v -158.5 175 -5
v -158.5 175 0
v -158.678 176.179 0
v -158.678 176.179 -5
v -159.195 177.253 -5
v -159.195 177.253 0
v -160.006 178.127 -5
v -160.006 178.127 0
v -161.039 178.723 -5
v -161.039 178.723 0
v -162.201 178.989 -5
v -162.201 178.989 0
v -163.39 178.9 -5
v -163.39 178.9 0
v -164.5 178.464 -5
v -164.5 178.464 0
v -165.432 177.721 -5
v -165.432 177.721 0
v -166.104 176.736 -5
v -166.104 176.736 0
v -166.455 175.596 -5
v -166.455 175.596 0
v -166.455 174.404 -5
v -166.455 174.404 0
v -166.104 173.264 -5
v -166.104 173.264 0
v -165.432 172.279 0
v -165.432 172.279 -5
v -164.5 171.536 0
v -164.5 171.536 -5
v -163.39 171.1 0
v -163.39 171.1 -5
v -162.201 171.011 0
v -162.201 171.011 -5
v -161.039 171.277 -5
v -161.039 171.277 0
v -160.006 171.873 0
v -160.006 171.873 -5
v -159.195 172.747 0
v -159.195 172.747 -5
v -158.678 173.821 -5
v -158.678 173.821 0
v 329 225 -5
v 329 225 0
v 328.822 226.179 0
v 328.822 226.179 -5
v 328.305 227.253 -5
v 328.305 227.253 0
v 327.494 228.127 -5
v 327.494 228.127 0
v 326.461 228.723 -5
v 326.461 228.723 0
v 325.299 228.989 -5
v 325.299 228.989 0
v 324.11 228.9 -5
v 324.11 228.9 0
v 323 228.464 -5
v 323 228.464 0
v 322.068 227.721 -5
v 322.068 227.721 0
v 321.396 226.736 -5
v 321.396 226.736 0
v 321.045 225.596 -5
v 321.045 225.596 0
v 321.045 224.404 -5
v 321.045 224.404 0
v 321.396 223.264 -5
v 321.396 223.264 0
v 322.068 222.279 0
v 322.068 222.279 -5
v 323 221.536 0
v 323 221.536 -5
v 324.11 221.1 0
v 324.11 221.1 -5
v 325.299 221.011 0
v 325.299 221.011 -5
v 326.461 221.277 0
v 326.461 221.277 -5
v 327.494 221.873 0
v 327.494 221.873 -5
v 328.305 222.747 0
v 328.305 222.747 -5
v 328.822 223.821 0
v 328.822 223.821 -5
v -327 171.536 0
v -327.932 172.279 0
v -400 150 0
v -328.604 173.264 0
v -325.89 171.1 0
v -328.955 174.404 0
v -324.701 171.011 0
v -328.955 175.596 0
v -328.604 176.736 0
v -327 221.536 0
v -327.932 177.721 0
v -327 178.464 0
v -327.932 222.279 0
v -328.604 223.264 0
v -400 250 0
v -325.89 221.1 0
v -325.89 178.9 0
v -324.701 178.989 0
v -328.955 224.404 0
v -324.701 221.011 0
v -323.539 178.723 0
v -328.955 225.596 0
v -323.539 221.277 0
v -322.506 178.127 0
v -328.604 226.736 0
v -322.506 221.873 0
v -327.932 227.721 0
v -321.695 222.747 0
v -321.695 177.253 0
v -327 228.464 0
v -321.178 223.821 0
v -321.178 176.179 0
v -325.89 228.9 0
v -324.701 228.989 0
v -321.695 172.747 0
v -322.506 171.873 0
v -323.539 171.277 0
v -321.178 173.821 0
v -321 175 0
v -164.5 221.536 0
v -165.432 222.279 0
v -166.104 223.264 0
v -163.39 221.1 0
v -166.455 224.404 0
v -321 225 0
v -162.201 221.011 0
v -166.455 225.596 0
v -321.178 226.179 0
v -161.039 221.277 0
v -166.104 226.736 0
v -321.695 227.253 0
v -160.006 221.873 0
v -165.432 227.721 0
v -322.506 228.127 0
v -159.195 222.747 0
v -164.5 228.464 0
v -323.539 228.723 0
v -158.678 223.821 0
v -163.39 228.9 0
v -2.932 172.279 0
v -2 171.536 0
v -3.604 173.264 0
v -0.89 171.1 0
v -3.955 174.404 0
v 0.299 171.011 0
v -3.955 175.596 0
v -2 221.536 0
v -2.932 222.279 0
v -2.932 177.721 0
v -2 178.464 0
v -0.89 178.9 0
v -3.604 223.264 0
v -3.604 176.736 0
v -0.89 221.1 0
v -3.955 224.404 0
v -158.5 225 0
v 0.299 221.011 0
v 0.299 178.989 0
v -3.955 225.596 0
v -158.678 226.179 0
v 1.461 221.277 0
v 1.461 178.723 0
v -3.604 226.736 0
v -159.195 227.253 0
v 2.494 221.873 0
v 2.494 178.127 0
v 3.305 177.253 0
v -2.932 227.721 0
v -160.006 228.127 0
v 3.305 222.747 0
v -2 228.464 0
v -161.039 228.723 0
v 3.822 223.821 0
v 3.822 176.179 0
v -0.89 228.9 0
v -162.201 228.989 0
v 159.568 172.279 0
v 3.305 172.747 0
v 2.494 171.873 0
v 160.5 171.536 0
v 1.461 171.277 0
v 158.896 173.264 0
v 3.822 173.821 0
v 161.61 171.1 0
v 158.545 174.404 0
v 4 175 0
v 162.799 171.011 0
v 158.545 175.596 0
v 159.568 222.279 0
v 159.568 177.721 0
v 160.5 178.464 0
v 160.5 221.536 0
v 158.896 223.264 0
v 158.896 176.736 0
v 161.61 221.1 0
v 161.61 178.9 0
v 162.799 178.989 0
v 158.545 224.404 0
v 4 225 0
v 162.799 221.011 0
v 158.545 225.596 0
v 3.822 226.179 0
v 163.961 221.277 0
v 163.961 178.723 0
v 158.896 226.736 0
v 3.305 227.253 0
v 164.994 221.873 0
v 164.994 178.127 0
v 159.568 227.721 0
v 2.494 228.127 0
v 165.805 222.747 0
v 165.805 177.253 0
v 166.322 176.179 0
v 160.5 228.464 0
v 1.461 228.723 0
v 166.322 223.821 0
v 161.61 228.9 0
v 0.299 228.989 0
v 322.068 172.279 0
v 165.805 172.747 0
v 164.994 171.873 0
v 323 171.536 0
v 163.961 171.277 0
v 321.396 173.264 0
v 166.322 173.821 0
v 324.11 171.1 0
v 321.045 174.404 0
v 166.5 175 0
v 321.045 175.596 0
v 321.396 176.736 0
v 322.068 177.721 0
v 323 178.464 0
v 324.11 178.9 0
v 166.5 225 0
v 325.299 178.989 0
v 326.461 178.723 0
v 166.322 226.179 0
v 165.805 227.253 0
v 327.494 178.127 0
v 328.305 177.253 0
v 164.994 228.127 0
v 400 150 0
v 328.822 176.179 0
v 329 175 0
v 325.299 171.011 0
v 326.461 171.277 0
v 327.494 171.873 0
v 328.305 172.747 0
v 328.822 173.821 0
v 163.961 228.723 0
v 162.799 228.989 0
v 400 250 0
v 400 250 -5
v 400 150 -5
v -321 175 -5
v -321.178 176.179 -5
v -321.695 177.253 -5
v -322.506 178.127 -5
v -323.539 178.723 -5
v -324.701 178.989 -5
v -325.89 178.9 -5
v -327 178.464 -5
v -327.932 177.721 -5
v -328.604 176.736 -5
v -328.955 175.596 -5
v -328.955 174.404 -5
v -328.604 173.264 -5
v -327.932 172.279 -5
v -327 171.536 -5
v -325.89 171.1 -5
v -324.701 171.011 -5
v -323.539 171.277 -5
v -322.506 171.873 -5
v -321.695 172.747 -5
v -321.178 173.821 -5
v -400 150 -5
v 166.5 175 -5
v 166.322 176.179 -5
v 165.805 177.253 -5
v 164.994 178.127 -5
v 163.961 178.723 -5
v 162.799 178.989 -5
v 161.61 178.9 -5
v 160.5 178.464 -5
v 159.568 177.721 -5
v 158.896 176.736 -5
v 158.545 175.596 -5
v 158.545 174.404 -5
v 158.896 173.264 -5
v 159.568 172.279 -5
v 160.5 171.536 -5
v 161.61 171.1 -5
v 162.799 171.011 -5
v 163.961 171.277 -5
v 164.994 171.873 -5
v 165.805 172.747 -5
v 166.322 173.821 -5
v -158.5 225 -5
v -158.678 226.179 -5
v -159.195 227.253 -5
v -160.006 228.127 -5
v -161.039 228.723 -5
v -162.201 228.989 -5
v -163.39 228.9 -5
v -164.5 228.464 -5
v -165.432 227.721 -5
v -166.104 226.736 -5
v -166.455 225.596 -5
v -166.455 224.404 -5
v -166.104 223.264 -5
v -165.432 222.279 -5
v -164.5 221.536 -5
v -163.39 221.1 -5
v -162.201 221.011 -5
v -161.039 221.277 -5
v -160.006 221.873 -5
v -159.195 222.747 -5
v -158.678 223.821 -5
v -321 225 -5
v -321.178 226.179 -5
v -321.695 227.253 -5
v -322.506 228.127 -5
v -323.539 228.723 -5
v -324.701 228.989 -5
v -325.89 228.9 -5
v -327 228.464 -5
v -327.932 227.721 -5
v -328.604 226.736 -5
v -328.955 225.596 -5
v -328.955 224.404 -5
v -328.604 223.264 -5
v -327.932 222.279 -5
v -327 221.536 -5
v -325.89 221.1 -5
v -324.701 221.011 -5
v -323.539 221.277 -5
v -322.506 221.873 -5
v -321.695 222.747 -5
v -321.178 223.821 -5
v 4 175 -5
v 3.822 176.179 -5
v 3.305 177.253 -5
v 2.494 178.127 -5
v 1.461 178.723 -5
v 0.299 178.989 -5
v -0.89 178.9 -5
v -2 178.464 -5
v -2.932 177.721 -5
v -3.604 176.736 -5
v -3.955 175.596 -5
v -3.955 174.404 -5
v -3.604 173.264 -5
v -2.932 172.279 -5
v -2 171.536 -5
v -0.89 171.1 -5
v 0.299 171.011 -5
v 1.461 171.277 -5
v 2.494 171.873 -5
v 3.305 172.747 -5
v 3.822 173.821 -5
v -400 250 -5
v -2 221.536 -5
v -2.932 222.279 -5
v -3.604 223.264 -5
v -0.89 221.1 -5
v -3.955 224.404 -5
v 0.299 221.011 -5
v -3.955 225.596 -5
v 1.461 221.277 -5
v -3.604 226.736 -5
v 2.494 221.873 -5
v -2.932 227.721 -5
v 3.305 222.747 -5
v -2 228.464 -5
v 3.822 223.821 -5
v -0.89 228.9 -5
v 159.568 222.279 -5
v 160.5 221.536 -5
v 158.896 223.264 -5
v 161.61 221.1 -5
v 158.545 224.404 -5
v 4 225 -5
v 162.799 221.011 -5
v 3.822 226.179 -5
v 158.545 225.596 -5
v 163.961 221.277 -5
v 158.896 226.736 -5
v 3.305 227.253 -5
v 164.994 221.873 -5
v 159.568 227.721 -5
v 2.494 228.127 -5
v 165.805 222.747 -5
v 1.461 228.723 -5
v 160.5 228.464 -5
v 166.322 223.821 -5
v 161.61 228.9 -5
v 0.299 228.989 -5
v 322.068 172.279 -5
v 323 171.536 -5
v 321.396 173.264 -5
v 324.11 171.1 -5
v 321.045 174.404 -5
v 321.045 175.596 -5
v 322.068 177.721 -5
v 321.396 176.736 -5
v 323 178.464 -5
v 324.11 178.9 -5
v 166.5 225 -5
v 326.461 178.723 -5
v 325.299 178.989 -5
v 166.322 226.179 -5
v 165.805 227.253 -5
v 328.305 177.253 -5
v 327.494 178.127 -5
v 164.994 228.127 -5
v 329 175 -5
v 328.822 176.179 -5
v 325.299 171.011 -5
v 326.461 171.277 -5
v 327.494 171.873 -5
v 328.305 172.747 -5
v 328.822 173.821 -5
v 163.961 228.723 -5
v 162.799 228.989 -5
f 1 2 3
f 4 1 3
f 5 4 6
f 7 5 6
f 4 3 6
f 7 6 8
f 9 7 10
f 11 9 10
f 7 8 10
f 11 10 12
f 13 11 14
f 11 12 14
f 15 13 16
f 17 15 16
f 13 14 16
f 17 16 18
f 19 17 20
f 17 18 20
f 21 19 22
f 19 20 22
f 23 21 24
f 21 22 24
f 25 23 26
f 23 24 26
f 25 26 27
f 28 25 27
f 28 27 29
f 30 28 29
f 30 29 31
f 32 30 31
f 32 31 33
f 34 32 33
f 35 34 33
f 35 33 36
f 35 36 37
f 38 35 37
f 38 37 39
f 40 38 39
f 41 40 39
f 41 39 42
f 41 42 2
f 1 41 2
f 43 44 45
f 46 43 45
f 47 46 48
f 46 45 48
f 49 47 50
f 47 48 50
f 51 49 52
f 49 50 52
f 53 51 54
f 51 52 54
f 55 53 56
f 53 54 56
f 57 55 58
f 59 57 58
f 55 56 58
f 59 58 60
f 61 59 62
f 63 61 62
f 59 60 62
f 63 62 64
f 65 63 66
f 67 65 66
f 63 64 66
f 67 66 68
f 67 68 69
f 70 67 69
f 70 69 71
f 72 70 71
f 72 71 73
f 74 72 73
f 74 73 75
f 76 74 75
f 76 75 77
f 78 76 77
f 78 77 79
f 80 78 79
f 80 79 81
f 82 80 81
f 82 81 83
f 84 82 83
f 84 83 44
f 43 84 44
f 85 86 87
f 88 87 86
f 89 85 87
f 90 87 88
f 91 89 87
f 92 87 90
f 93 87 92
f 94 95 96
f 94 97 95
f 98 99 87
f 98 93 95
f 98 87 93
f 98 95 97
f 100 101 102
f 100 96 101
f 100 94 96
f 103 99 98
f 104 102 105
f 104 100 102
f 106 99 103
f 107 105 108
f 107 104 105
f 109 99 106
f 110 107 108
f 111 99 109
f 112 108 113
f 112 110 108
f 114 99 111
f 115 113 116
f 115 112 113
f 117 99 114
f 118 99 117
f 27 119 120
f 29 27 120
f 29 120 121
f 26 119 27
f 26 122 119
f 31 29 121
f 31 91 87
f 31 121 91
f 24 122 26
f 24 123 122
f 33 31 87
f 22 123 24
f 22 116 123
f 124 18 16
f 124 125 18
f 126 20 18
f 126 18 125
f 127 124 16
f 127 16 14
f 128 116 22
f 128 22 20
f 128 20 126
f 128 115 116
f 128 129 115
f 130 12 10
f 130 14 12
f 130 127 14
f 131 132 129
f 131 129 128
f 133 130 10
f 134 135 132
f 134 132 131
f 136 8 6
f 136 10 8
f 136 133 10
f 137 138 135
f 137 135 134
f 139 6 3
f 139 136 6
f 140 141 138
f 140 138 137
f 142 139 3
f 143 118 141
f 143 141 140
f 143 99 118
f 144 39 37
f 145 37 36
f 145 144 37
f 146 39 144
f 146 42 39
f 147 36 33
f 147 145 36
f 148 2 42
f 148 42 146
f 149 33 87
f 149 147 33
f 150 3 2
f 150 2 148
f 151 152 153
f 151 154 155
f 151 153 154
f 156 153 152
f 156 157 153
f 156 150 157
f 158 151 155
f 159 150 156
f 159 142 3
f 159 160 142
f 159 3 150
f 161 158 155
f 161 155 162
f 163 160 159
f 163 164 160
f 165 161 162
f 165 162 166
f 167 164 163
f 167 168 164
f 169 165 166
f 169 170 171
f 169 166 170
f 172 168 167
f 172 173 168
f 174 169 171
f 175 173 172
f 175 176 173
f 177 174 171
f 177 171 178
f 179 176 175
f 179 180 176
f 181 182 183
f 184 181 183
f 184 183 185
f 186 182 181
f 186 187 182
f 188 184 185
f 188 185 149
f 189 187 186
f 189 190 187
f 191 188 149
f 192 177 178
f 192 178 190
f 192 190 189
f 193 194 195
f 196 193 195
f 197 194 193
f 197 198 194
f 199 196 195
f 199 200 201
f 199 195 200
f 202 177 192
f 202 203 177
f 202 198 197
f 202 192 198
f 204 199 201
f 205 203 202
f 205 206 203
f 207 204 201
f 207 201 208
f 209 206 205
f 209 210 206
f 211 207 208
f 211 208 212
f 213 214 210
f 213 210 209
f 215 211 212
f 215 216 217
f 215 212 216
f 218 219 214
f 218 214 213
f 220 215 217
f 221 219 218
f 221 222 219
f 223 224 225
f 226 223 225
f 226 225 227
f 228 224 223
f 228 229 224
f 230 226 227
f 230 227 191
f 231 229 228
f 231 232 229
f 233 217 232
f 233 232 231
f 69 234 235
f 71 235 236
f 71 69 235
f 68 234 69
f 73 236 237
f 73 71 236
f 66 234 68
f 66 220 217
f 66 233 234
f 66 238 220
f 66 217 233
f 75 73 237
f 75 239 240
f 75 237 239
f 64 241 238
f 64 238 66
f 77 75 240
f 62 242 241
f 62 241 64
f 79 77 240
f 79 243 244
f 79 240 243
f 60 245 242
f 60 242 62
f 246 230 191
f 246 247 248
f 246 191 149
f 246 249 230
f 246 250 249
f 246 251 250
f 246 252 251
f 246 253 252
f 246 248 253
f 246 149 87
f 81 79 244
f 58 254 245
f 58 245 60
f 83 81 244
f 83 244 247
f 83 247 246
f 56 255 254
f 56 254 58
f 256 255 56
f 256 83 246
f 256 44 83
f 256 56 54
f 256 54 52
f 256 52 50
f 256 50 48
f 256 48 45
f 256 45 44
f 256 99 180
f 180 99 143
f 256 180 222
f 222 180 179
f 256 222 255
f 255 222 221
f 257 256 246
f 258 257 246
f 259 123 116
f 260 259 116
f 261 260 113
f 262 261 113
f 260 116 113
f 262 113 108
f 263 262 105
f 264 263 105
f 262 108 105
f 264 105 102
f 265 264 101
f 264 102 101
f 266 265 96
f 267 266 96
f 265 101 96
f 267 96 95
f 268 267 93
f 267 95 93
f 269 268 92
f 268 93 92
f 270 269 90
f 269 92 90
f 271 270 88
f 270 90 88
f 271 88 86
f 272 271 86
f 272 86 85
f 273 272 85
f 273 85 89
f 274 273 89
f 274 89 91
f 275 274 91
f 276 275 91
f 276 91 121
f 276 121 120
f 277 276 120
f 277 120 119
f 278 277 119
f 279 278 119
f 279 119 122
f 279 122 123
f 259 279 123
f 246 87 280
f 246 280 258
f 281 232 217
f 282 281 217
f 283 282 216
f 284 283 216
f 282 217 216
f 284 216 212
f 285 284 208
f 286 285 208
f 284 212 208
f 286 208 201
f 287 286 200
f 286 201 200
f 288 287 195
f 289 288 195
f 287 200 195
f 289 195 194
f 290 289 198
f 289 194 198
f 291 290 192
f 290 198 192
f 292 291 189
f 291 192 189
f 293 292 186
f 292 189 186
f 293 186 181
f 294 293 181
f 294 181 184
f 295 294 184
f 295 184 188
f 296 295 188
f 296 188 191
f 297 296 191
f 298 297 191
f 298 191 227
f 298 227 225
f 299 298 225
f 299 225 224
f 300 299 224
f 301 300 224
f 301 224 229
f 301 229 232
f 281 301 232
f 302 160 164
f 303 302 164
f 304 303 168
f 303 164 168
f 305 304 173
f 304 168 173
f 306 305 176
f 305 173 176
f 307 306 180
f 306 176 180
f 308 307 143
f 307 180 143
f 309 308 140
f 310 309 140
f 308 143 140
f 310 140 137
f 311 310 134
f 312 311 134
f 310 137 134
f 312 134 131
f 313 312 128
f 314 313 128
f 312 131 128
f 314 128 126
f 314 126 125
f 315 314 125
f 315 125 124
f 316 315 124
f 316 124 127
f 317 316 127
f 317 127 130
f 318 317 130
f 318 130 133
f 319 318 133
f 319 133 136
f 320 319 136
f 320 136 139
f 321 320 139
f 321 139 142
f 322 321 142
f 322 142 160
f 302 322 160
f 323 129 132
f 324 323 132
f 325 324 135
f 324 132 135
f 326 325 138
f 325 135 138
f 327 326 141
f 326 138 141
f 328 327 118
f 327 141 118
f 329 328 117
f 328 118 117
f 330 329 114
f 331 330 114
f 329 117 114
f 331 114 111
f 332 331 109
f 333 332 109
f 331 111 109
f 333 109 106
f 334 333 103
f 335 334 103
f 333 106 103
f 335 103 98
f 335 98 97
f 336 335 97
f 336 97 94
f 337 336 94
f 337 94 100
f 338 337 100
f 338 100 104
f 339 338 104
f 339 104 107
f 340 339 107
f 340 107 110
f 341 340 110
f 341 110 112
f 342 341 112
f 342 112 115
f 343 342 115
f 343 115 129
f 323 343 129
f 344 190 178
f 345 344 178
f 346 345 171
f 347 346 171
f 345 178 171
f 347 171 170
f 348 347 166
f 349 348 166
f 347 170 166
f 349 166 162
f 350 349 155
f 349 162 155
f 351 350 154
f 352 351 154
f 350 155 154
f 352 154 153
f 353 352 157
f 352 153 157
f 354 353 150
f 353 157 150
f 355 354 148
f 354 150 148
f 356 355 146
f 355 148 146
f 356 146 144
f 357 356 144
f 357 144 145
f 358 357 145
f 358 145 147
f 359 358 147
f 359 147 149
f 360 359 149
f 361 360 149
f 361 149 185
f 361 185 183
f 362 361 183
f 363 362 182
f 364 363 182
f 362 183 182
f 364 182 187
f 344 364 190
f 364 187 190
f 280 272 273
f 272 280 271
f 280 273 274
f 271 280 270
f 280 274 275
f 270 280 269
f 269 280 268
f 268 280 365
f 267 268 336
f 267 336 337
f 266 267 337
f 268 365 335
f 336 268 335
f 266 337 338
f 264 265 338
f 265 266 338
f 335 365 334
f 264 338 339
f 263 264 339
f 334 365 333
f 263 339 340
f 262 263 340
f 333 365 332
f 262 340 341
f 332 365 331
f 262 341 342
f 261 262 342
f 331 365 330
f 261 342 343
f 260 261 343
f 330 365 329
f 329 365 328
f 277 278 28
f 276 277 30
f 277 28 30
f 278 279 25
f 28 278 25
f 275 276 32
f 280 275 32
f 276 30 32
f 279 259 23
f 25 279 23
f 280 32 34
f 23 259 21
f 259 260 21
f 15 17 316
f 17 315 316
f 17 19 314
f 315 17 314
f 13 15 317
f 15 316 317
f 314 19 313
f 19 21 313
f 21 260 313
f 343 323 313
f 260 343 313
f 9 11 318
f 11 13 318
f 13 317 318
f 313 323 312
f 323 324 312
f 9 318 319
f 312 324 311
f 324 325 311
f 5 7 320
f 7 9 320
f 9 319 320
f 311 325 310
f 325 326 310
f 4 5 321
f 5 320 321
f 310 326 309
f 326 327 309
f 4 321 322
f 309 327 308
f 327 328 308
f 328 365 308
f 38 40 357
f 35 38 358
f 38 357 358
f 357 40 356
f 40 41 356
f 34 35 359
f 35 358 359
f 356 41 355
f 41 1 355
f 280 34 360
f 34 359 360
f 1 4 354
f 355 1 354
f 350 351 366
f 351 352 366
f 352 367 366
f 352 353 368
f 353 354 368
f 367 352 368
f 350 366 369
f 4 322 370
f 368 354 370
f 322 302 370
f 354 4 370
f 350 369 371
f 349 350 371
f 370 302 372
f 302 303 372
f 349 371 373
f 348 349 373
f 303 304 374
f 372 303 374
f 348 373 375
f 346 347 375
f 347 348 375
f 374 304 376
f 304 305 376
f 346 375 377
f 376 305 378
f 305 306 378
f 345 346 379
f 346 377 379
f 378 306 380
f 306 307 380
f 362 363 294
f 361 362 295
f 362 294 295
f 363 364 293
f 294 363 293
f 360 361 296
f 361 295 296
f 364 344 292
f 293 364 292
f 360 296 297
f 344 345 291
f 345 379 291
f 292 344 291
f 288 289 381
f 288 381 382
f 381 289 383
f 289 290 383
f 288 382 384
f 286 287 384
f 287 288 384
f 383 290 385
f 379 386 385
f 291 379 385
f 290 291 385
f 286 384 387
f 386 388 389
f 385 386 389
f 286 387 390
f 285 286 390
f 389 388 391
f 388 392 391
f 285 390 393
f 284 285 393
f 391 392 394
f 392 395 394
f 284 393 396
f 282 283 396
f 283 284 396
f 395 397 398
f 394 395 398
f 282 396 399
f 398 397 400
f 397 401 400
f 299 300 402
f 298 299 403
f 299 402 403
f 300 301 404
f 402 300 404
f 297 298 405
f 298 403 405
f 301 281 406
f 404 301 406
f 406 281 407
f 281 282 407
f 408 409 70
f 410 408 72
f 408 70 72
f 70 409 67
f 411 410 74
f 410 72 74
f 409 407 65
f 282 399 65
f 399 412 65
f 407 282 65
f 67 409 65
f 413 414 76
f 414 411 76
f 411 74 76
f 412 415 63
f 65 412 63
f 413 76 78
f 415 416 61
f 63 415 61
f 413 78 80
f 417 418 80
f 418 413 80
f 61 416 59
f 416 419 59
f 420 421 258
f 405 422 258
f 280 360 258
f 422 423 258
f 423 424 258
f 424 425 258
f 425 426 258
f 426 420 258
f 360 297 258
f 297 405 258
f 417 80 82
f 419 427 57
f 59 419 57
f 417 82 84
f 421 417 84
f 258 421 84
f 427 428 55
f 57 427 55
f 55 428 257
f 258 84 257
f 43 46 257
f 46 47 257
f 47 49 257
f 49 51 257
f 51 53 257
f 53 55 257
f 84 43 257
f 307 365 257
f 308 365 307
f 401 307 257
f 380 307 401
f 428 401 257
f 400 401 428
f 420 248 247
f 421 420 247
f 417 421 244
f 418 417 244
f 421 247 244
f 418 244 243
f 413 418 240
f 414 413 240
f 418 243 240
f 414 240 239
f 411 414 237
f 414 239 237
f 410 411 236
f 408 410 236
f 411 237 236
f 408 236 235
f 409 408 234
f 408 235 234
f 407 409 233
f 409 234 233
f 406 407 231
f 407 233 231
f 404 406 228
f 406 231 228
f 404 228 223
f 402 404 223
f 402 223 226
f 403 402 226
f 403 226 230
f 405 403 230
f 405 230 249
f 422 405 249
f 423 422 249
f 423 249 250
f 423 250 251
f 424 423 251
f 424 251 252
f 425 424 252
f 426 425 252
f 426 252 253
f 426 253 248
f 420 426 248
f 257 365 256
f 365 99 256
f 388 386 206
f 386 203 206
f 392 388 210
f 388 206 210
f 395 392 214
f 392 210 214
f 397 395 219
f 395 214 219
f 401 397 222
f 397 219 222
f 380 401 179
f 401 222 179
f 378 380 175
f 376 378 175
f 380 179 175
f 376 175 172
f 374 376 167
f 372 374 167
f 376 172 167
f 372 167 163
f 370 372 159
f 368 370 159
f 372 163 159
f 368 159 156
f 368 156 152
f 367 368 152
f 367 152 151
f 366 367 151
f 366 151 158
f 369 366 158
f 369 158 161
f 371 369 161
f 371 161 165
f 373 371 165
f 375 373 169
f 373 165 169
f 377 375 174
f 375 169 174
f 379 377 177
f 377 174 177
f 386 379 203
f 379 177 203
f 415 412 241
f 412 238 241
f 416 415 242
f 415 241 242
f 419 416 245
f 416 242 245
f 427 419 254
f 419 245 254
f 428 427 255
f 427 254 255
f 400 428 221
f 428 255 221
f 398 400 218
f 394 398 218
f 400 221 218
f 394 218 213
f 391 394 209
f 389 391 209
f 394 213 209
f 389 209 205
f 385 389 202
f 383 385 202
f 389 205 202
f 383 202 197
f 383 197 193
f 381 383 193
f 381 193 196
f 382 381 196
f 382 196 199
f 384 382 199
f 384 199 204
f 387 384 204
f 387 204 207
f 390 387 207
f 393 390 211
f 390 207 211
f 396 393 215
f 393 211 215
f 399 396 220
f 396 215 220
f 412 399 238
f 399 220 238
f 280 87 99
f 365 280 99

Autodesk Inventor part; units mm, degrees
ref_plane "YZ Plane" through (0, 0, 0) normal (1, 0, 0) x (0, 1, 0)
ref_plane "XZ Plane" through (0, 0, 0) normal (0, 1, 0) x (-1, 0, 0)
ref_plane "XY Plane" through (0, 0, 0) normal (0, 0, 1) x (1, 0, 0)
sketch "base_layout_sketch" plane through (0, 0, 0) normal (0, 0, 1) x (1, 0, 0)
  line L0 (-400, 200) -> (400, 200)
  line L1 (400, 200) -> (400, -200)
  line L2 (400, -200) -> (-400, -200)
  line L3 (-400, -200) -> (-400, 200)
  line L4 (0, 200) -> (0, -200) construction
  line L5 (-400, 150) -> (400, 150)
  line L6 (400, 150) -> (400, -150)
  line L7 (400, -150) -> (-400, -150)
  line L8 (-400, -150) -> (-400, 150)
  line L9 (0, 150) -> (0, -150) construction
  line L10 (-400, 250) -> (400, 250)
  line L11 (400, 250) -> (400, -250)
  line L12 (400, -250) -> (-400, -250)
  line L13 (-400, -250) -> (-400, 250)
  line L14 (0, 250) -> (0, -250) construction
  point P0 (0, 0)
  point P1 (0, 0)
  point P2 (-400, 200)
  point P3 (-400, -200)
  point P4 (400, -200)
  point P5 (400, 200)
  dimension "d0" = 400
  dimension "d1" = 800
  dimension "d2" = 300
  dimension "d4" = 500
sketch "bolt_holes_sketch" plane through (0, 0, 0) normal (0, 0, 1) x (1, 0, 0)
  circle A0 centre (-325, 175) radius 4
  line L0 (-400, 250) -> (400, 250) projected
  line L1 (-400, -250) -> (-400, 250) projected
  line L2 (-560, 0) -> (560, 0) projected
  point P0 (0, 0)
  dimension "d3" = 8
  dimension "d6" = 75
  dimension "d21" = 175
extrude "sheet_visualisation" add sketch "base_layout_sketch" against normal blind 5
extrude "bolt_holes Cut" cut sketch "bolt_holes_sketch" against normal through all
pattern_linear "bolt_holes_upper Pattern" count 5 spacing 162.5 along (1, 0, 0) of "bolt_holes Cut"
mirror "bolt_holes Mirror" about plane through (0, 0, 0) normal (0, 1, 0) of "bolt_holes Cut", "bolt_holes_upper Pattern"
ref_plane "Work Plane1" through (-400, 200, 0) normal (0, -1, 0) x (1, 0, 0)
mirror "Mirror2" about plane through (-400, 200, 0) normal (0, -1, 0) of "bolt_holes Cut", "bolt_holes_upper Pattern"
sketch "Sketch3" plane through (0, 0, 0) normal (0, 0, 1) x (1, 0, 0)
  line L0 (400, -250) -> (400, 250) projected
  line L1 (-400, 250) -> (-400, -250) projected
  line L2 (400, -250) -> (-400, -250)
  line L3 (-400, -250) -> (-400, 150)
  line L4 (-400, 150) -> (400, 150)
  line L5 (400, 150) -> (400, -250)
  point P0 (0, 0)
  dimension "d27" = 400
extrude "Extrusion3" cut sketch "Sketch3" against normal blind 9.5
equation "\"d0\" = layer_width"
equation "\"d1\" = track_length"
equation "\"d2\" = track_width"
equation "\"d4\" = real_sheet_width"
equation "\"d3\" = bolt_diameter"
equation "\"d6\" = x_offset_for_bolts"
equation "\"d21\" = y_offset_for_bolts"
equation "\"d14\" = sheet_thickness"
equation "\"track_length\" = 800"
equation "\"layer_width\" = 400"
equation "\"bolt_diameter\" = 8"
equation "\"real_sheet_width\" = 500"
equation "\"x_offset_for_bolts\" = 75"
equation "\"y_offset_for_bolts\" = 175"
equation "\"sheet_thickness\" = 5"
equation "\"track_width\" = 300"
equation "\"ferrite_length\" = 109"
equation "\"ferrite_width\" = 15"
equation "\"ferrite_height\" = 8"
equation "\"edge_gap_distance\" = 14.5"
equation "\"wire_diameter\" = 4.5"
equation "\"distance_between_wires\" = -1.2 * wire_diameter + 0.2 * parameter_6"
equation "\"distance_between_wires_edge\" = -1.5 * wire_diameter + 0.5 * parameter_2"
equation "\"bend_radius_inner\" = 15"
equation "\"wall_thickness\" = 25"
equation "\"parameter_6\" = 120"
equation "\"parameter_2\" = 30"
properties part number "bolt_holess_for_double_guides"
